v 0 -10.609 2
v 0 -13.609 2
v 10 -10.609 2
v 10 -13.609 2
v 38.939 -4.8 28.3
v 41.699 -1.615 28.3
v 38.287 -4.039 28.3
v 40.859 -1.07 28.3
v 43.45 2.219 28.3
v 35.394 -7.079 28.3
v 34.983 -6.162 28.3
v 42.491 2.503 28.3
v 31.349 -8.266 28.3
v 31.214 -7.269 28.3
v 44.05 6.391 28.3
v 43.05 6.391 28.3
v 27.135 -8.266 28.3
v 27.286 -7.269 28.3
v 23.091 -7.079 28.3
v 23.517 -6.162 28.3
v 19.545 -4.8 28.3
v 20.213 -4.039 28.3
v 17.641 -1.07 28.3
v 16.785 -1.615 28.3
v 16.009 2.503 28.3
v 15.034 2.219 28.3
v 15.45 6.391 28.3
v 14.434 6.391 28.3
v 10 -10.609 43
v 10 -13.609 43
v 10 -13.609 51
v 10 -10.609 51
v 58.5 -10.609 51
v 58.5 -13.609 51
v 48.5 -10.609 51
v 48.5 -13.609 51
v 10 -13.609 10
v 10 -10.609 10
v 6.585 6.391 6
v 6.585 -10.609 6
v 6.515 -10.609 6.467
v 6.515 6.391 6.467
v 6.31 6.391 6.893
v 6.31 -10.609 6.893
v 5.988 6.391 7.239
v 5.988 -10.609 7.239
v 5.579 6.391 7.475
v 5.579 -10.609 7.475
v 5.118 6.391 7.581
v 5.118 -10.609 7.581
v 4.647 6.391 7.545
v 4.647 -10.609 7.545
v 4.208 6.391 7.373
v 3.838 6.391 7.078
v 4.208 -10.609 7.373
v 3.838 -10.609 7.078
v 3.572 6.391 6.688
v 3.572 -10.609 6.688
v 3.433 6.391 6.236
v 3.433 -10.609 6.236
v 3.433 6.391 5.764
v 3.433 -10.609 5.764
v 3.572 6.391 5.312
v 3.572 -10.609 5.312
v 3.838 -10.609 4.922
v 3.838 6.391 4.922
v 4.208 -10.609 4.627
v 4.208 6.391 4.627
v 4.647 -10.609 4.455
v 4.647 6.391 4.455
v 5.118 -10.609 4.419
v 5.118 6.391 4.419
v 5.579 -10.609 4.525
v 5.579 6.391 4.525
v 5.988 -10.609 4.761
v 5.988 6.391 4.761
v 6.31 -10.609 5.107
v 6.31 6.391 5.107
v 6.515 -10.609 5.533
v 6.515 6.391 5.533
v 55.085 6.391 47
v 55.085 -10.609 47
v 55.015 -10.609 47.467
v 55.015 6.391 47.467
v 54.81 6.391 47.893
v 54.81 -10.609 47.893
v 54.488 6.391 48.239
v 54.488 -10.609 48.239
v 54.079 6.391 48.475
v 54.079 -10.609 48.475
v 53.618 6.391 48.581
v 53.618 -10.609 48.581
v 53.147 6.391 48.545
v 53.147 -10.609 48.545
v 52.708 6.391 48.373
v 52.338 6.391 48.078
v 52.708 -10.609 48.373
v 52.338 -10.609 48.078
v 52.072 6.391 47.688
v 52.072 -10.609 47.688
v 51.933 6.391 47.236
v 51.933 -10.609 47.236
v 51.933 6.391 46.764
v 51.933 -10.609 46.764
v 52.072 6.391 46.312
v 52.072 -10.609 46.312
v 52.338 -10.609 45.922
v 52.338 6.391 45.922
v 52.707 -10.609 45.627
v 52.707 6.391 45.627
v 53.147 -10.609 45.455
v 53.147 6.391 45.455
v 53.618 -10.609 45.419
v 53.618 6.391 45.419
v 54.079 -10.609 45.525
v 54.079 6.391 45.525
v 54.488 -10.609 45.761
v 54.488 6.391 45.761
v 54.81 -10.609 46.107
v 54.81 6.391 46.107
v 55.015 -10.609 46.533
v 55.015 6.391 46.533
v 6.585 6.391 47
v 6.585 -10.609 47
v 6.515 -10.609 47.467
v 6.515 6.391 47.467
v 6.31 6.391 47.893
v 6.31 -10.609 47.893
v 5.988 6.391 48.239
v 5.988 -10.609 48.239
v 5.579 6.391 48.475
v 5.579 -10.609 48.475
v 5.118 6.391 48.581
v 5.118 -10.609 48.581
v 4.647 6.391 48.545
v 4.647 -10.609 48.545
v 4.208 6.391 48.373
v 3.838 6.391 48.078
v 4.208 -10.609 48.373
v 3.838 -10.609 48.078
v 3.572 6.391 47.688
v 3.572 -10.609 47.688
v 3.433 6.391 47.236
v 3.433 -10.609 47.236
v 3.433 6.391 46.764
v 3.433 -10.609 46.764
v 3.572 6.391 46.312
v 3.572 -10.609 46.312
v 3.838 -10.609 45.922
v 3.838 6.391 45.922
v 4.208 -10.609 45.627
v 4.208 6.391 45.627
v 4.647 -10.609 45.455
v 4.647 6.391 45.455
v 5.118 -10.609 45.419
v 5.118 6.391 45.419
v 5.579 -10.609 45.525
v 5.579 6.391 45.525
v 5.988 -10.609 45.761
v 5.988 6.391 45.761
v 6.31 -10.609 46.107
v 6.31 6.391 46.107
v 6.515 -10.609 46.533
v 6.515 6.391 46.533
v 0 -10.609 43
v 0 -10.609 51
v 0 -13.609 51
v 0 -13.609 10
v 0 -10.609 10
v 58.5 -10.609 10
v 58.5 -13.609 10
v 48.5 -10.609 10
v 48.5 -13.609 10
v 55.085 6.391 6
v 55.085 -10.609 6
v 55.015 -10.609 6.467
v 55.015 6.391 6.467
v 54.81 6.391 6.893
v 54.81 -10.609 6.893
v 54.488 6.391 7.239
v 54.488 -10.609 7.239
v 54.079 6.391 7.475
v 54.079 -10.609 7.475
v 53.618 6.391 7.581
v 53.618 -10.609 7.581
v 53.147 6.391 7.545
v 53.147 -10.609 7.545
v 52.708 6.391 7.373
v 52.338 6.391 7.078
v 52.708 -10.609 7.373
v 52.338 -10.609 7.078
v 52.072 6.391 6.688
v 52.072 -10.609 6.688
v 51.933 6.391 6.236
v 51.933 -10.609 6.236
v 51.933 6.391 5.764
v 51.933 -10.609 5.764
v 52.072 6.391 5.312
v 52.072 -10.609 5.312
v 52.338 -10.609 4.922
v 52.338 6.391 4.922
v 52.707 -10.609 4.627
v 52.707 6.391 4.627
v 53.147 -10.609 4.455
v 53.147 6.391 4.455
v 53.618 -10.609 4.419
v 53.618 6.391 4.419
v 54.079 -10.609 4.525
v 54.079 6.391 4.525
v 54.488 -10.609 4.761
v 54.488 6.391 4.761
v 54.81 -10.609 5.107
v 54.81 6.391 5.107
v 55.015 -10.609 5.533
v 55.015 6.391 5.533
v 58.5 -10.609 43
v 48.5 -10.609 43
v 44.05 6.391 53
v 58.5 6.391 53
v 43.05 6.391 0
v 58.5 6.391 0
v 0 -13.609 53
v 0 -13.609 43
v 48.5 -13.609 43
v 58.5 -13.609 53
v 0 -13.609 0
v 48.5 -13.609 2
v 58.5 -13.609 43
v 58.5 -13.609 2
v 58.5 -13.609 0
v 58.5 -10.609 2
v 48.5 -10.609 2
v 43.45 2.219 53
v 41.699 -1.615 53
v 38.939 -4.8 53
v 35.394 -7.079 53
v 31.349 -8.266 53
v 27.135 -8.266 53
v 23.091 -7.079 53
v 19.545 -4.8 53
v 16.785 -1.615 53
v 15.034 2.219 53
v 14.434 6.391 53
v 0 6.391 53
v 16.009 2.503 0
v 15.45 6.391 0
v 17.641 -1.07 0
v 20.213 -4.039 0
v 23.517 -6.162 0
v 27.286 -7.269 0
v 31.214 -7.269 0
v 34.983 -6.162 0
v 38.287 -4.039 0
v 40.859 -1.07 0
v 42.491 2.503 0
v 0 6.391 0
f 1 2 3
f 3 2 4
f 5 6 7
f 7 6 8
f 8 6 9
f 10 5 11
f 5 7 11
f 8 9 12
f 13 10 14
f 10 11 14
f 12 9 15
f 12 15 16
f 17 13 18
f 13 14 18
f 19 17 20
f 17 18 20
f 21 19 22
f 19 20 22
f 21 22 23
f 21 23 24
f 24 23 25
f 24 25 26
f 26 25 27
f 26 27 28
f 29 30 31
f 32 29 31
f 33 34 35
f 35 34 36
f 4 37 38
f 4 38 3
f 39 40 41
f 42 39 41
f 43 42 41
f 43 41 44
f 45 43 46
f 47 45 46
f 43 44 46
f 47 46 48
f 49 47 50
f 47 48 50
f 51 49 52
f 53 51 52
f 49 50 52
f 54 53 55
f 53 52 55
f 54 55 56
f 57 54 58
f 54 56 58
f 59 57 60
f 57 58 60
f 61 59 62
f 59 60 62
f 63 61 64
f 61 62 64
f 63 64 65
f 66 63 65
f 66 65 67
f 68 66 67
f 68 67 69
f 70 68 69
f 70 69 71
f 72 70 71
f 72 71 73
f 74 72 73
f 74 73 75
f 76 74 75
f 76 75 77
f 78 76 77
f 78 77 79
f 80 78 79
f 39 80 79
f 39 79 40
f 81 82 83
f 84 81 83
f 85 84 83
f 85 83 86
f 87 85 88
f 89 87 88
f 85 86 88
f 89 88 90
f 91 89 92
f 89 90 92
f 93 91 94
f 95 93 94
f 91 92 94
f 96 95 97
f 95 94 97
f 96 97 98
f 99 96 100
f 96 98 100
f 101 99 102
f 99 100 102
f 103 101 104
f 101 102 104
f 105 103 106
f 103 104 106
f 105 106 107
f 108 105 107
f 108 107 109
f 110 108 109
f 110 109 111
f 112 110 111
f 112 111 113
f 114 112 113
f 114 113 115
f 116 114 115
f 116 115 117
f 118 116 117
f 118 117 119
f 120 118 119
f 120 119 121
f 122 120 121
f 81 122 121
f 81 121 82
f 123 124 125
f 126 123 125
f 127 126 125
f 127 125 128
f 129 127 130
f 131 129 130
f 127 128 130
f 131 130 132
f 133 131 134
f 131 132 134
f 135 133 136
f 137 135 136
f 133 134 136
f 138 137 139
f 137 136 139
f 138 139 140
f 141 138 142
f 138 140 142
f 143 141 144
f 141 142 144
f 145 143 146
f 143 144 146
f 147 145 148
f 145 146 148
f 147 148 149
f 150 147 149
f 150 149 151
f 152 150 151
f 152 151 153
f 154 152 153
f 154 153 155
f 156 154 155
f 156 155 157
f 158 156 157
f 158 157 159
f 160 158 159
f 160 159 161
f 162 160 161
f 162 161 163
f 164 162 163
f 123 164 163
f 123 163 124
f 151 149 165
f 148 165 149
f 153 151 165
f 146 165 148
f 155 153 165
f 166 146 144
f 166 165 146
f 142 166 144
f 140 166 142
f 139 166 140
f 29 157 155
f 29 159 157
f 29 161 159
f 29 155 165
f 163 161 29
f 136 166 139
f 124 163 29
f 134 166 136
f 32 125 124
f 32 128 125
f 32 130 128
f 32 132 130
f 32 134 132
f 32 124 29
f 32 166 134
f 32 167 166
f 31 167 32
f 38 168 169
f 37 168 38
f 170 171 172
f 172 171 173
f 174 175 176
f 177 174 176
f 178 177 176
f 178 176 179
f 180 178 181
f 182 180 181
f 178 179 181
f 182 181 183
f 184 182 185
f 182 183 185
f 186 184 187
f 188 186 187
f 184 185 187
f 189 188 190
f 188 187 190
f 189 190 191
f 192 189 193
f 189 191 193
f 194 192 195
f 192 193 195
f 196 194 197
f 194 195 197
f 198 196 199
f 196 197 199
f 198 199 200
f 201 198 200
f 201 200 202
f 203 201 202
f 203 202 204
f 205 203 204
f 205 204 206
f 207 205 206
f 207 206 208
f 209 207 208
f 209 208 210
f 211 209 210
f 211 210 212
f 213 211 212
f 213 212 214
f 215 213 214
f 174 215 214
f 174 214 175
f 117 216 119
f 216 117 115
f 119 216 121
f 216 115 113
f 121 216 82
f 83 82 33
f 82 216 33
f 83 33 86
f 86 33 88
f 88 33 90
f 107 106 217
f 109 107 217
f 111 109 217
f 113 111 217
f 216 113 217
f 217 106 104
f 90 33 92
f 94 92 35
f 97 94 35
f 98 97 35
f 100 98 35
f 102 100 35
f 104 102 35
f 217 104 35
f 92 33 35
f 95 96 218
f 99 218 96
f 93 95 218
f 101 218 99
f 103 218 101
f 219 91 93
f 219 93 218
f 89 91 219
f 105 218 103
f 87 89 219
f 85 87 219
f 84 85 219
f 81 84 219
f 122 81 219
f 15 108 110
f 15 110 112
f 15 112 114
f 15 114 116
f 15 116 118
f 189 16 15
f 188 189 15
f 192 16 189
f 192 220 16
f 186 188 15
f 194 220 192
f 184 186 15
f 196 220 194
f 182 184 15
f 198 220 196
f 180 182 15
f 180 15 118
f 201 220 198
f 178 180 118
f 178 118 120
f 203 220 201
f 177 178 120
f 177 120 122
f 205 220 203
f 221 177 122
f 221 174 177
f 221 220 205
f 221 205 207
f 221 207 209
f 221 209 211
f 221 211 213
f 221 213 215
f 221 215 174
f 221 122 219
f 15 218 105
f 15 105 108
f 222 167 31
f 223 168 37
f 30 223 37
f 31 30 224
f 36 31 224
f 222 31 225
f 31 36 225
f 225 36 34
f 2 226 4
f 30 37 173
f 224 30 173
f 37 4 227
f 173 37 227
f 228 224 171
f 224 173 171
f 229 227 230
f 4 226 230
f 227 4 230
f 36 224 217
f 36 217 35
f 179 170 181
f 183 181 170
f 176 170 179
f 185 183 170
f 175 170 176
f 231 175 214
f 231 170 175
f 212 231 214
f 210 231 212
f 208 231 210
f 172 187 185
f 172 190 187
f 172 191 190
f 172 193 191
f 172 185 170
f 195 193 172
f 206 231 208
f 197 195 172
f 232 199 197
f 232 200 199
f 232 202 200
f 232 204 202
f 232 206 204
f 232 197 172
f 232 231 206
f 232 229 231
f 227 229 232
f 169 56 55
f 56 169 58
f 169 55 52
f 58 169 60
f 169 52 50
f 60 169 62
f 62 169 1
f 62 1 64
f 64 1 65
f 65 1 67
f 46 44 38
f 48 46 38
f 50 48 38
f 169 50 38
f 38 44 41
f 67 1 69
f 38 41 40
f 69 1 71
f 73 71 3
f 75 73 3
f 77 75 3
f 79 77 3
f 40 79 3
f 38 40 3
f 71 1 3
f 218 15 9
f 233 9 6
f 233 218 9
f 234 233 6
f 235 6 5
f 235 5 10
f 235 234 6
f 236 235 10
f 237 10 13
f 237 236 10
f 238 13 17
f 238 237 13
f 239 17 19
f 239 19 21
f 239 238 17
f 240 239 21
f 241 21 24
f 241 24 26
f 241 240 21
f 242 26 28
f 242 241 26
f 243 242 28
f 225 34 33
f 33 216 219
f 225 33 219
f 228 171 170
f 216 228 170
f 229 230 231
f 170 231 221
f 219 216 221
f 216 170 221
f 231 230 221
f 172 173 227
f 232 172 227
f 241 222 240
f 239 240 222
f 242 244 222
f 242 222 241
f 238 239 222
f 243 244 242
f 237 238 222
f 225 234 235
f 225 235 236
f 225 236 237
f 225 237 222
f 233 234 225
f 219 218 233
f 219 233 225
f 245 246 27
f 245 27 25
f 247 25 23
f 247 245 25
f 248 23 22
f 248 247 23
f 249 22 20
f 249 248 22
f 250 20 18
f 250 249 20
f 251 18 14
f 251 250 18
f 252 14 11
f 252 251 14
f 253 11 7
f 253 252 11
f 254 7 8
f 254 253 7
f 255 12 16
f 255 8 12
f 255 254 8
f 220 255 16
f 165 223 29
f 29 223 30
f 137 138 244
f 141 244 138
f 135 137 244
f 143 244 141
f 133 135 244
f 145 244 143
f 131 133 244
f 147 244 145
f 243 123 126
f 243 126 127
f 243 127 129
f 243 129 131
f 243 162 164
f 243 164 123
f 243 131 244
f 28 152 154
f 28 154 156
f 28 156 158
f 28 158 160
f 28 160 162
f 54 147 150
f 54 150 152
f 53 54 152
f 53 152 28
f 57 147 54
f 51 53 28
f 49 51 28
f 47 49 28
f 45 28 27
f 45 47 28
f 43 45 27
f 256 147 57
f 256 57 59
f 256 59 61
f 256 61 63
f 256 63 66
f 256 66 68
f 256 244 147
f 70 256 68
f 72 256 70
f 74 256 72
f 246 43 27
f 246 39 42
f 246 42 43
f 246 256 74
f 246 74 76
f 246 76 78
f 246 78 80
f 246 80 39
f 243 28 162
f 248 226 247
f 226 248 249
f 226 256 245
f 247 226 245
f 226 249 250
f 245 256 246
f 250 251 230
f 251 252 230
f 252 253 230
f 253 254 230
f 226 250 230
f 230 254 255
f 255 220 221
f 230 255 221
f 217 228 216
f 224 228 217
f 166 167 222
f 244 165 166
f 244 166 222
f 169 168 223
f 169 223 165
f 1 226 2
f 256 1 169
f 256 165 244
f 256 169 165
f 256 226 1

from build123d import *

# Parameters (mm, degrees)
SKETCH1_W                                  = 58.5
SKETCH1_H                                  = 20
BOSS_EXTRUDE1_DEPTH                        = 53
CUT_EXTRUDE2_DEPTH                         = 24.7
CUT_EXTRUDE3_DEPTH                         = 32.4
SKETCH8_W                                  = 10
SKETCH8_H                                  = 8
CUT_EXTRUDE6_DEPTH                         = 3
SKETCH7_R                                  = 1.585
CUT_EXTRUDE5_DEPTH                         = 92.5
MIRROR1_AT_THE_SECOND_PLANE_COPY_1_SKETC_W = 10
MIRROR1_AT_THE_SECOND_PLANE_COPY_1_SKETC_H = 8
MIRROR1_AT_THE_SECOND_PLANE_COPY_1_DEPTH   = 3


with BuildPart() as part:
    # Sketch1 → Boss-Extrude1 (new body)
    with BuildSketch(Plane.XY):
        with Locations((29.25, -3.609195402)):
            Rectangle(SKETCH1_W, SKETCH1_H)
    extrude(amount=BOSS_EXTRUDE1_DEPTH)

    # Sketch3 → Cut-Extrude2 (cut)
    with BuildSketch(Plane.XY.offset(53)):
        with BuildLine():
            Line((14.434183752, 6.390804598), (44.05, 6.390804598))
            ThreePointArc((44.05, 6.390804598), (29.242091876, -8.417103526), (14.434183752, 6.390804598))
        make_face()
    extrude(amount=-CUT_EXTRUDE2_DEPTH, mode=Mode.SUBTRACT)

    # Sketch5 → Cut-Extrude3 (cut)
    with BuildSketch(Plane(origin=(0, 0, 0), x_dir=(-1, 0, 0), z_dir=(0, 0, -1))):
        with BuildLine():
            Line((-43.05, 6.390804598), (-15.45, 6.390804598))
            ThreePointArc((-15.45, 6.390804598), (-29.25, -7.409195402), (-43.05, 6.390804598))
        make_face()
    extrude(amount=-CUT_EXTRUDE3_DEPTH, mode=Mode.SUBTRACT)

    # Sketch8 → Cut-Extrude6 (cut)
    with BuildSketch(Plane(origin=(0, -13.609195402, 0), x_dir=(-1, 0, 0), z_dir=(0, -1, 0))):
        with Locations((-53.5, -6)):
            Rectangle(SKETCH8_W, SKETCH8_H)
    cut_extrude6 = extrude(amount=-CUT_EXTRUDE6_DEPTH, mode=Mode.SUBTRACT)

    # Sketch7 → Cut-Extrude5 (cut)
    with BuildSketch(Plane(origin=(0, -13.609195402, 0), x_dir=(-1, 0, 0), z_dir=(0, -1, 0))):
        with Locations(Location((-53.5, -47, 0), (0, 0, 180))):
            Circle(SKETCH7_R)
        with Locations(Location((-53.5, -6, 0), (0, 0, 180))):
            Circle(SKETCH7_R)
        with Locations(Location((-5, -6, 0), (0, 0, 180))):
            Circle(SKETCH7_R)
        with Locations(Location((-5, -47, 0), (0, 0, 180))):
            Circle(SKETCH7_R)
    extrude(amount=-CUT_EXTRUDE5_DEPTH, mode=Mode.SUBTRACT)

    # Mirror1: Cut-Extrude6 across plane
    add(cut_extrude6.mirror(Plane.XY.offset(26.5)), mode=Mode.SUBTRACT)

    # Mirror1 at the second plane: Cut-Extrude6 across plane
    add(cut_extrude6.mirror(Plane.ZY.offset(-29.25)), mode=Mode.SUBTRACT)

    # Mirror1 at the second plane copy 1 sketc → Mirror1 at the second plane copy 1 (cut)
    with BuildSketch(Plane(origin=(58.5, -13.609195402, 53), x_dir=(1, 0, 0), z_dir=(0, -1, 0))):
        with Locations((-53.5, -6)):
            Rectangle(MIRROR1_AT_THE_SECOND_PLANE_COPY_1_SKETC_W, MIRROR1_AT_THE_SECOND_PLANE_COPY_1_SKETC_H)
    extrude(amount=-MIRROR1_AT_THE_SECOND_PLANE_COPY_1_DEPTH, mode=Mode.SUBTRACT)


solid = part.part
